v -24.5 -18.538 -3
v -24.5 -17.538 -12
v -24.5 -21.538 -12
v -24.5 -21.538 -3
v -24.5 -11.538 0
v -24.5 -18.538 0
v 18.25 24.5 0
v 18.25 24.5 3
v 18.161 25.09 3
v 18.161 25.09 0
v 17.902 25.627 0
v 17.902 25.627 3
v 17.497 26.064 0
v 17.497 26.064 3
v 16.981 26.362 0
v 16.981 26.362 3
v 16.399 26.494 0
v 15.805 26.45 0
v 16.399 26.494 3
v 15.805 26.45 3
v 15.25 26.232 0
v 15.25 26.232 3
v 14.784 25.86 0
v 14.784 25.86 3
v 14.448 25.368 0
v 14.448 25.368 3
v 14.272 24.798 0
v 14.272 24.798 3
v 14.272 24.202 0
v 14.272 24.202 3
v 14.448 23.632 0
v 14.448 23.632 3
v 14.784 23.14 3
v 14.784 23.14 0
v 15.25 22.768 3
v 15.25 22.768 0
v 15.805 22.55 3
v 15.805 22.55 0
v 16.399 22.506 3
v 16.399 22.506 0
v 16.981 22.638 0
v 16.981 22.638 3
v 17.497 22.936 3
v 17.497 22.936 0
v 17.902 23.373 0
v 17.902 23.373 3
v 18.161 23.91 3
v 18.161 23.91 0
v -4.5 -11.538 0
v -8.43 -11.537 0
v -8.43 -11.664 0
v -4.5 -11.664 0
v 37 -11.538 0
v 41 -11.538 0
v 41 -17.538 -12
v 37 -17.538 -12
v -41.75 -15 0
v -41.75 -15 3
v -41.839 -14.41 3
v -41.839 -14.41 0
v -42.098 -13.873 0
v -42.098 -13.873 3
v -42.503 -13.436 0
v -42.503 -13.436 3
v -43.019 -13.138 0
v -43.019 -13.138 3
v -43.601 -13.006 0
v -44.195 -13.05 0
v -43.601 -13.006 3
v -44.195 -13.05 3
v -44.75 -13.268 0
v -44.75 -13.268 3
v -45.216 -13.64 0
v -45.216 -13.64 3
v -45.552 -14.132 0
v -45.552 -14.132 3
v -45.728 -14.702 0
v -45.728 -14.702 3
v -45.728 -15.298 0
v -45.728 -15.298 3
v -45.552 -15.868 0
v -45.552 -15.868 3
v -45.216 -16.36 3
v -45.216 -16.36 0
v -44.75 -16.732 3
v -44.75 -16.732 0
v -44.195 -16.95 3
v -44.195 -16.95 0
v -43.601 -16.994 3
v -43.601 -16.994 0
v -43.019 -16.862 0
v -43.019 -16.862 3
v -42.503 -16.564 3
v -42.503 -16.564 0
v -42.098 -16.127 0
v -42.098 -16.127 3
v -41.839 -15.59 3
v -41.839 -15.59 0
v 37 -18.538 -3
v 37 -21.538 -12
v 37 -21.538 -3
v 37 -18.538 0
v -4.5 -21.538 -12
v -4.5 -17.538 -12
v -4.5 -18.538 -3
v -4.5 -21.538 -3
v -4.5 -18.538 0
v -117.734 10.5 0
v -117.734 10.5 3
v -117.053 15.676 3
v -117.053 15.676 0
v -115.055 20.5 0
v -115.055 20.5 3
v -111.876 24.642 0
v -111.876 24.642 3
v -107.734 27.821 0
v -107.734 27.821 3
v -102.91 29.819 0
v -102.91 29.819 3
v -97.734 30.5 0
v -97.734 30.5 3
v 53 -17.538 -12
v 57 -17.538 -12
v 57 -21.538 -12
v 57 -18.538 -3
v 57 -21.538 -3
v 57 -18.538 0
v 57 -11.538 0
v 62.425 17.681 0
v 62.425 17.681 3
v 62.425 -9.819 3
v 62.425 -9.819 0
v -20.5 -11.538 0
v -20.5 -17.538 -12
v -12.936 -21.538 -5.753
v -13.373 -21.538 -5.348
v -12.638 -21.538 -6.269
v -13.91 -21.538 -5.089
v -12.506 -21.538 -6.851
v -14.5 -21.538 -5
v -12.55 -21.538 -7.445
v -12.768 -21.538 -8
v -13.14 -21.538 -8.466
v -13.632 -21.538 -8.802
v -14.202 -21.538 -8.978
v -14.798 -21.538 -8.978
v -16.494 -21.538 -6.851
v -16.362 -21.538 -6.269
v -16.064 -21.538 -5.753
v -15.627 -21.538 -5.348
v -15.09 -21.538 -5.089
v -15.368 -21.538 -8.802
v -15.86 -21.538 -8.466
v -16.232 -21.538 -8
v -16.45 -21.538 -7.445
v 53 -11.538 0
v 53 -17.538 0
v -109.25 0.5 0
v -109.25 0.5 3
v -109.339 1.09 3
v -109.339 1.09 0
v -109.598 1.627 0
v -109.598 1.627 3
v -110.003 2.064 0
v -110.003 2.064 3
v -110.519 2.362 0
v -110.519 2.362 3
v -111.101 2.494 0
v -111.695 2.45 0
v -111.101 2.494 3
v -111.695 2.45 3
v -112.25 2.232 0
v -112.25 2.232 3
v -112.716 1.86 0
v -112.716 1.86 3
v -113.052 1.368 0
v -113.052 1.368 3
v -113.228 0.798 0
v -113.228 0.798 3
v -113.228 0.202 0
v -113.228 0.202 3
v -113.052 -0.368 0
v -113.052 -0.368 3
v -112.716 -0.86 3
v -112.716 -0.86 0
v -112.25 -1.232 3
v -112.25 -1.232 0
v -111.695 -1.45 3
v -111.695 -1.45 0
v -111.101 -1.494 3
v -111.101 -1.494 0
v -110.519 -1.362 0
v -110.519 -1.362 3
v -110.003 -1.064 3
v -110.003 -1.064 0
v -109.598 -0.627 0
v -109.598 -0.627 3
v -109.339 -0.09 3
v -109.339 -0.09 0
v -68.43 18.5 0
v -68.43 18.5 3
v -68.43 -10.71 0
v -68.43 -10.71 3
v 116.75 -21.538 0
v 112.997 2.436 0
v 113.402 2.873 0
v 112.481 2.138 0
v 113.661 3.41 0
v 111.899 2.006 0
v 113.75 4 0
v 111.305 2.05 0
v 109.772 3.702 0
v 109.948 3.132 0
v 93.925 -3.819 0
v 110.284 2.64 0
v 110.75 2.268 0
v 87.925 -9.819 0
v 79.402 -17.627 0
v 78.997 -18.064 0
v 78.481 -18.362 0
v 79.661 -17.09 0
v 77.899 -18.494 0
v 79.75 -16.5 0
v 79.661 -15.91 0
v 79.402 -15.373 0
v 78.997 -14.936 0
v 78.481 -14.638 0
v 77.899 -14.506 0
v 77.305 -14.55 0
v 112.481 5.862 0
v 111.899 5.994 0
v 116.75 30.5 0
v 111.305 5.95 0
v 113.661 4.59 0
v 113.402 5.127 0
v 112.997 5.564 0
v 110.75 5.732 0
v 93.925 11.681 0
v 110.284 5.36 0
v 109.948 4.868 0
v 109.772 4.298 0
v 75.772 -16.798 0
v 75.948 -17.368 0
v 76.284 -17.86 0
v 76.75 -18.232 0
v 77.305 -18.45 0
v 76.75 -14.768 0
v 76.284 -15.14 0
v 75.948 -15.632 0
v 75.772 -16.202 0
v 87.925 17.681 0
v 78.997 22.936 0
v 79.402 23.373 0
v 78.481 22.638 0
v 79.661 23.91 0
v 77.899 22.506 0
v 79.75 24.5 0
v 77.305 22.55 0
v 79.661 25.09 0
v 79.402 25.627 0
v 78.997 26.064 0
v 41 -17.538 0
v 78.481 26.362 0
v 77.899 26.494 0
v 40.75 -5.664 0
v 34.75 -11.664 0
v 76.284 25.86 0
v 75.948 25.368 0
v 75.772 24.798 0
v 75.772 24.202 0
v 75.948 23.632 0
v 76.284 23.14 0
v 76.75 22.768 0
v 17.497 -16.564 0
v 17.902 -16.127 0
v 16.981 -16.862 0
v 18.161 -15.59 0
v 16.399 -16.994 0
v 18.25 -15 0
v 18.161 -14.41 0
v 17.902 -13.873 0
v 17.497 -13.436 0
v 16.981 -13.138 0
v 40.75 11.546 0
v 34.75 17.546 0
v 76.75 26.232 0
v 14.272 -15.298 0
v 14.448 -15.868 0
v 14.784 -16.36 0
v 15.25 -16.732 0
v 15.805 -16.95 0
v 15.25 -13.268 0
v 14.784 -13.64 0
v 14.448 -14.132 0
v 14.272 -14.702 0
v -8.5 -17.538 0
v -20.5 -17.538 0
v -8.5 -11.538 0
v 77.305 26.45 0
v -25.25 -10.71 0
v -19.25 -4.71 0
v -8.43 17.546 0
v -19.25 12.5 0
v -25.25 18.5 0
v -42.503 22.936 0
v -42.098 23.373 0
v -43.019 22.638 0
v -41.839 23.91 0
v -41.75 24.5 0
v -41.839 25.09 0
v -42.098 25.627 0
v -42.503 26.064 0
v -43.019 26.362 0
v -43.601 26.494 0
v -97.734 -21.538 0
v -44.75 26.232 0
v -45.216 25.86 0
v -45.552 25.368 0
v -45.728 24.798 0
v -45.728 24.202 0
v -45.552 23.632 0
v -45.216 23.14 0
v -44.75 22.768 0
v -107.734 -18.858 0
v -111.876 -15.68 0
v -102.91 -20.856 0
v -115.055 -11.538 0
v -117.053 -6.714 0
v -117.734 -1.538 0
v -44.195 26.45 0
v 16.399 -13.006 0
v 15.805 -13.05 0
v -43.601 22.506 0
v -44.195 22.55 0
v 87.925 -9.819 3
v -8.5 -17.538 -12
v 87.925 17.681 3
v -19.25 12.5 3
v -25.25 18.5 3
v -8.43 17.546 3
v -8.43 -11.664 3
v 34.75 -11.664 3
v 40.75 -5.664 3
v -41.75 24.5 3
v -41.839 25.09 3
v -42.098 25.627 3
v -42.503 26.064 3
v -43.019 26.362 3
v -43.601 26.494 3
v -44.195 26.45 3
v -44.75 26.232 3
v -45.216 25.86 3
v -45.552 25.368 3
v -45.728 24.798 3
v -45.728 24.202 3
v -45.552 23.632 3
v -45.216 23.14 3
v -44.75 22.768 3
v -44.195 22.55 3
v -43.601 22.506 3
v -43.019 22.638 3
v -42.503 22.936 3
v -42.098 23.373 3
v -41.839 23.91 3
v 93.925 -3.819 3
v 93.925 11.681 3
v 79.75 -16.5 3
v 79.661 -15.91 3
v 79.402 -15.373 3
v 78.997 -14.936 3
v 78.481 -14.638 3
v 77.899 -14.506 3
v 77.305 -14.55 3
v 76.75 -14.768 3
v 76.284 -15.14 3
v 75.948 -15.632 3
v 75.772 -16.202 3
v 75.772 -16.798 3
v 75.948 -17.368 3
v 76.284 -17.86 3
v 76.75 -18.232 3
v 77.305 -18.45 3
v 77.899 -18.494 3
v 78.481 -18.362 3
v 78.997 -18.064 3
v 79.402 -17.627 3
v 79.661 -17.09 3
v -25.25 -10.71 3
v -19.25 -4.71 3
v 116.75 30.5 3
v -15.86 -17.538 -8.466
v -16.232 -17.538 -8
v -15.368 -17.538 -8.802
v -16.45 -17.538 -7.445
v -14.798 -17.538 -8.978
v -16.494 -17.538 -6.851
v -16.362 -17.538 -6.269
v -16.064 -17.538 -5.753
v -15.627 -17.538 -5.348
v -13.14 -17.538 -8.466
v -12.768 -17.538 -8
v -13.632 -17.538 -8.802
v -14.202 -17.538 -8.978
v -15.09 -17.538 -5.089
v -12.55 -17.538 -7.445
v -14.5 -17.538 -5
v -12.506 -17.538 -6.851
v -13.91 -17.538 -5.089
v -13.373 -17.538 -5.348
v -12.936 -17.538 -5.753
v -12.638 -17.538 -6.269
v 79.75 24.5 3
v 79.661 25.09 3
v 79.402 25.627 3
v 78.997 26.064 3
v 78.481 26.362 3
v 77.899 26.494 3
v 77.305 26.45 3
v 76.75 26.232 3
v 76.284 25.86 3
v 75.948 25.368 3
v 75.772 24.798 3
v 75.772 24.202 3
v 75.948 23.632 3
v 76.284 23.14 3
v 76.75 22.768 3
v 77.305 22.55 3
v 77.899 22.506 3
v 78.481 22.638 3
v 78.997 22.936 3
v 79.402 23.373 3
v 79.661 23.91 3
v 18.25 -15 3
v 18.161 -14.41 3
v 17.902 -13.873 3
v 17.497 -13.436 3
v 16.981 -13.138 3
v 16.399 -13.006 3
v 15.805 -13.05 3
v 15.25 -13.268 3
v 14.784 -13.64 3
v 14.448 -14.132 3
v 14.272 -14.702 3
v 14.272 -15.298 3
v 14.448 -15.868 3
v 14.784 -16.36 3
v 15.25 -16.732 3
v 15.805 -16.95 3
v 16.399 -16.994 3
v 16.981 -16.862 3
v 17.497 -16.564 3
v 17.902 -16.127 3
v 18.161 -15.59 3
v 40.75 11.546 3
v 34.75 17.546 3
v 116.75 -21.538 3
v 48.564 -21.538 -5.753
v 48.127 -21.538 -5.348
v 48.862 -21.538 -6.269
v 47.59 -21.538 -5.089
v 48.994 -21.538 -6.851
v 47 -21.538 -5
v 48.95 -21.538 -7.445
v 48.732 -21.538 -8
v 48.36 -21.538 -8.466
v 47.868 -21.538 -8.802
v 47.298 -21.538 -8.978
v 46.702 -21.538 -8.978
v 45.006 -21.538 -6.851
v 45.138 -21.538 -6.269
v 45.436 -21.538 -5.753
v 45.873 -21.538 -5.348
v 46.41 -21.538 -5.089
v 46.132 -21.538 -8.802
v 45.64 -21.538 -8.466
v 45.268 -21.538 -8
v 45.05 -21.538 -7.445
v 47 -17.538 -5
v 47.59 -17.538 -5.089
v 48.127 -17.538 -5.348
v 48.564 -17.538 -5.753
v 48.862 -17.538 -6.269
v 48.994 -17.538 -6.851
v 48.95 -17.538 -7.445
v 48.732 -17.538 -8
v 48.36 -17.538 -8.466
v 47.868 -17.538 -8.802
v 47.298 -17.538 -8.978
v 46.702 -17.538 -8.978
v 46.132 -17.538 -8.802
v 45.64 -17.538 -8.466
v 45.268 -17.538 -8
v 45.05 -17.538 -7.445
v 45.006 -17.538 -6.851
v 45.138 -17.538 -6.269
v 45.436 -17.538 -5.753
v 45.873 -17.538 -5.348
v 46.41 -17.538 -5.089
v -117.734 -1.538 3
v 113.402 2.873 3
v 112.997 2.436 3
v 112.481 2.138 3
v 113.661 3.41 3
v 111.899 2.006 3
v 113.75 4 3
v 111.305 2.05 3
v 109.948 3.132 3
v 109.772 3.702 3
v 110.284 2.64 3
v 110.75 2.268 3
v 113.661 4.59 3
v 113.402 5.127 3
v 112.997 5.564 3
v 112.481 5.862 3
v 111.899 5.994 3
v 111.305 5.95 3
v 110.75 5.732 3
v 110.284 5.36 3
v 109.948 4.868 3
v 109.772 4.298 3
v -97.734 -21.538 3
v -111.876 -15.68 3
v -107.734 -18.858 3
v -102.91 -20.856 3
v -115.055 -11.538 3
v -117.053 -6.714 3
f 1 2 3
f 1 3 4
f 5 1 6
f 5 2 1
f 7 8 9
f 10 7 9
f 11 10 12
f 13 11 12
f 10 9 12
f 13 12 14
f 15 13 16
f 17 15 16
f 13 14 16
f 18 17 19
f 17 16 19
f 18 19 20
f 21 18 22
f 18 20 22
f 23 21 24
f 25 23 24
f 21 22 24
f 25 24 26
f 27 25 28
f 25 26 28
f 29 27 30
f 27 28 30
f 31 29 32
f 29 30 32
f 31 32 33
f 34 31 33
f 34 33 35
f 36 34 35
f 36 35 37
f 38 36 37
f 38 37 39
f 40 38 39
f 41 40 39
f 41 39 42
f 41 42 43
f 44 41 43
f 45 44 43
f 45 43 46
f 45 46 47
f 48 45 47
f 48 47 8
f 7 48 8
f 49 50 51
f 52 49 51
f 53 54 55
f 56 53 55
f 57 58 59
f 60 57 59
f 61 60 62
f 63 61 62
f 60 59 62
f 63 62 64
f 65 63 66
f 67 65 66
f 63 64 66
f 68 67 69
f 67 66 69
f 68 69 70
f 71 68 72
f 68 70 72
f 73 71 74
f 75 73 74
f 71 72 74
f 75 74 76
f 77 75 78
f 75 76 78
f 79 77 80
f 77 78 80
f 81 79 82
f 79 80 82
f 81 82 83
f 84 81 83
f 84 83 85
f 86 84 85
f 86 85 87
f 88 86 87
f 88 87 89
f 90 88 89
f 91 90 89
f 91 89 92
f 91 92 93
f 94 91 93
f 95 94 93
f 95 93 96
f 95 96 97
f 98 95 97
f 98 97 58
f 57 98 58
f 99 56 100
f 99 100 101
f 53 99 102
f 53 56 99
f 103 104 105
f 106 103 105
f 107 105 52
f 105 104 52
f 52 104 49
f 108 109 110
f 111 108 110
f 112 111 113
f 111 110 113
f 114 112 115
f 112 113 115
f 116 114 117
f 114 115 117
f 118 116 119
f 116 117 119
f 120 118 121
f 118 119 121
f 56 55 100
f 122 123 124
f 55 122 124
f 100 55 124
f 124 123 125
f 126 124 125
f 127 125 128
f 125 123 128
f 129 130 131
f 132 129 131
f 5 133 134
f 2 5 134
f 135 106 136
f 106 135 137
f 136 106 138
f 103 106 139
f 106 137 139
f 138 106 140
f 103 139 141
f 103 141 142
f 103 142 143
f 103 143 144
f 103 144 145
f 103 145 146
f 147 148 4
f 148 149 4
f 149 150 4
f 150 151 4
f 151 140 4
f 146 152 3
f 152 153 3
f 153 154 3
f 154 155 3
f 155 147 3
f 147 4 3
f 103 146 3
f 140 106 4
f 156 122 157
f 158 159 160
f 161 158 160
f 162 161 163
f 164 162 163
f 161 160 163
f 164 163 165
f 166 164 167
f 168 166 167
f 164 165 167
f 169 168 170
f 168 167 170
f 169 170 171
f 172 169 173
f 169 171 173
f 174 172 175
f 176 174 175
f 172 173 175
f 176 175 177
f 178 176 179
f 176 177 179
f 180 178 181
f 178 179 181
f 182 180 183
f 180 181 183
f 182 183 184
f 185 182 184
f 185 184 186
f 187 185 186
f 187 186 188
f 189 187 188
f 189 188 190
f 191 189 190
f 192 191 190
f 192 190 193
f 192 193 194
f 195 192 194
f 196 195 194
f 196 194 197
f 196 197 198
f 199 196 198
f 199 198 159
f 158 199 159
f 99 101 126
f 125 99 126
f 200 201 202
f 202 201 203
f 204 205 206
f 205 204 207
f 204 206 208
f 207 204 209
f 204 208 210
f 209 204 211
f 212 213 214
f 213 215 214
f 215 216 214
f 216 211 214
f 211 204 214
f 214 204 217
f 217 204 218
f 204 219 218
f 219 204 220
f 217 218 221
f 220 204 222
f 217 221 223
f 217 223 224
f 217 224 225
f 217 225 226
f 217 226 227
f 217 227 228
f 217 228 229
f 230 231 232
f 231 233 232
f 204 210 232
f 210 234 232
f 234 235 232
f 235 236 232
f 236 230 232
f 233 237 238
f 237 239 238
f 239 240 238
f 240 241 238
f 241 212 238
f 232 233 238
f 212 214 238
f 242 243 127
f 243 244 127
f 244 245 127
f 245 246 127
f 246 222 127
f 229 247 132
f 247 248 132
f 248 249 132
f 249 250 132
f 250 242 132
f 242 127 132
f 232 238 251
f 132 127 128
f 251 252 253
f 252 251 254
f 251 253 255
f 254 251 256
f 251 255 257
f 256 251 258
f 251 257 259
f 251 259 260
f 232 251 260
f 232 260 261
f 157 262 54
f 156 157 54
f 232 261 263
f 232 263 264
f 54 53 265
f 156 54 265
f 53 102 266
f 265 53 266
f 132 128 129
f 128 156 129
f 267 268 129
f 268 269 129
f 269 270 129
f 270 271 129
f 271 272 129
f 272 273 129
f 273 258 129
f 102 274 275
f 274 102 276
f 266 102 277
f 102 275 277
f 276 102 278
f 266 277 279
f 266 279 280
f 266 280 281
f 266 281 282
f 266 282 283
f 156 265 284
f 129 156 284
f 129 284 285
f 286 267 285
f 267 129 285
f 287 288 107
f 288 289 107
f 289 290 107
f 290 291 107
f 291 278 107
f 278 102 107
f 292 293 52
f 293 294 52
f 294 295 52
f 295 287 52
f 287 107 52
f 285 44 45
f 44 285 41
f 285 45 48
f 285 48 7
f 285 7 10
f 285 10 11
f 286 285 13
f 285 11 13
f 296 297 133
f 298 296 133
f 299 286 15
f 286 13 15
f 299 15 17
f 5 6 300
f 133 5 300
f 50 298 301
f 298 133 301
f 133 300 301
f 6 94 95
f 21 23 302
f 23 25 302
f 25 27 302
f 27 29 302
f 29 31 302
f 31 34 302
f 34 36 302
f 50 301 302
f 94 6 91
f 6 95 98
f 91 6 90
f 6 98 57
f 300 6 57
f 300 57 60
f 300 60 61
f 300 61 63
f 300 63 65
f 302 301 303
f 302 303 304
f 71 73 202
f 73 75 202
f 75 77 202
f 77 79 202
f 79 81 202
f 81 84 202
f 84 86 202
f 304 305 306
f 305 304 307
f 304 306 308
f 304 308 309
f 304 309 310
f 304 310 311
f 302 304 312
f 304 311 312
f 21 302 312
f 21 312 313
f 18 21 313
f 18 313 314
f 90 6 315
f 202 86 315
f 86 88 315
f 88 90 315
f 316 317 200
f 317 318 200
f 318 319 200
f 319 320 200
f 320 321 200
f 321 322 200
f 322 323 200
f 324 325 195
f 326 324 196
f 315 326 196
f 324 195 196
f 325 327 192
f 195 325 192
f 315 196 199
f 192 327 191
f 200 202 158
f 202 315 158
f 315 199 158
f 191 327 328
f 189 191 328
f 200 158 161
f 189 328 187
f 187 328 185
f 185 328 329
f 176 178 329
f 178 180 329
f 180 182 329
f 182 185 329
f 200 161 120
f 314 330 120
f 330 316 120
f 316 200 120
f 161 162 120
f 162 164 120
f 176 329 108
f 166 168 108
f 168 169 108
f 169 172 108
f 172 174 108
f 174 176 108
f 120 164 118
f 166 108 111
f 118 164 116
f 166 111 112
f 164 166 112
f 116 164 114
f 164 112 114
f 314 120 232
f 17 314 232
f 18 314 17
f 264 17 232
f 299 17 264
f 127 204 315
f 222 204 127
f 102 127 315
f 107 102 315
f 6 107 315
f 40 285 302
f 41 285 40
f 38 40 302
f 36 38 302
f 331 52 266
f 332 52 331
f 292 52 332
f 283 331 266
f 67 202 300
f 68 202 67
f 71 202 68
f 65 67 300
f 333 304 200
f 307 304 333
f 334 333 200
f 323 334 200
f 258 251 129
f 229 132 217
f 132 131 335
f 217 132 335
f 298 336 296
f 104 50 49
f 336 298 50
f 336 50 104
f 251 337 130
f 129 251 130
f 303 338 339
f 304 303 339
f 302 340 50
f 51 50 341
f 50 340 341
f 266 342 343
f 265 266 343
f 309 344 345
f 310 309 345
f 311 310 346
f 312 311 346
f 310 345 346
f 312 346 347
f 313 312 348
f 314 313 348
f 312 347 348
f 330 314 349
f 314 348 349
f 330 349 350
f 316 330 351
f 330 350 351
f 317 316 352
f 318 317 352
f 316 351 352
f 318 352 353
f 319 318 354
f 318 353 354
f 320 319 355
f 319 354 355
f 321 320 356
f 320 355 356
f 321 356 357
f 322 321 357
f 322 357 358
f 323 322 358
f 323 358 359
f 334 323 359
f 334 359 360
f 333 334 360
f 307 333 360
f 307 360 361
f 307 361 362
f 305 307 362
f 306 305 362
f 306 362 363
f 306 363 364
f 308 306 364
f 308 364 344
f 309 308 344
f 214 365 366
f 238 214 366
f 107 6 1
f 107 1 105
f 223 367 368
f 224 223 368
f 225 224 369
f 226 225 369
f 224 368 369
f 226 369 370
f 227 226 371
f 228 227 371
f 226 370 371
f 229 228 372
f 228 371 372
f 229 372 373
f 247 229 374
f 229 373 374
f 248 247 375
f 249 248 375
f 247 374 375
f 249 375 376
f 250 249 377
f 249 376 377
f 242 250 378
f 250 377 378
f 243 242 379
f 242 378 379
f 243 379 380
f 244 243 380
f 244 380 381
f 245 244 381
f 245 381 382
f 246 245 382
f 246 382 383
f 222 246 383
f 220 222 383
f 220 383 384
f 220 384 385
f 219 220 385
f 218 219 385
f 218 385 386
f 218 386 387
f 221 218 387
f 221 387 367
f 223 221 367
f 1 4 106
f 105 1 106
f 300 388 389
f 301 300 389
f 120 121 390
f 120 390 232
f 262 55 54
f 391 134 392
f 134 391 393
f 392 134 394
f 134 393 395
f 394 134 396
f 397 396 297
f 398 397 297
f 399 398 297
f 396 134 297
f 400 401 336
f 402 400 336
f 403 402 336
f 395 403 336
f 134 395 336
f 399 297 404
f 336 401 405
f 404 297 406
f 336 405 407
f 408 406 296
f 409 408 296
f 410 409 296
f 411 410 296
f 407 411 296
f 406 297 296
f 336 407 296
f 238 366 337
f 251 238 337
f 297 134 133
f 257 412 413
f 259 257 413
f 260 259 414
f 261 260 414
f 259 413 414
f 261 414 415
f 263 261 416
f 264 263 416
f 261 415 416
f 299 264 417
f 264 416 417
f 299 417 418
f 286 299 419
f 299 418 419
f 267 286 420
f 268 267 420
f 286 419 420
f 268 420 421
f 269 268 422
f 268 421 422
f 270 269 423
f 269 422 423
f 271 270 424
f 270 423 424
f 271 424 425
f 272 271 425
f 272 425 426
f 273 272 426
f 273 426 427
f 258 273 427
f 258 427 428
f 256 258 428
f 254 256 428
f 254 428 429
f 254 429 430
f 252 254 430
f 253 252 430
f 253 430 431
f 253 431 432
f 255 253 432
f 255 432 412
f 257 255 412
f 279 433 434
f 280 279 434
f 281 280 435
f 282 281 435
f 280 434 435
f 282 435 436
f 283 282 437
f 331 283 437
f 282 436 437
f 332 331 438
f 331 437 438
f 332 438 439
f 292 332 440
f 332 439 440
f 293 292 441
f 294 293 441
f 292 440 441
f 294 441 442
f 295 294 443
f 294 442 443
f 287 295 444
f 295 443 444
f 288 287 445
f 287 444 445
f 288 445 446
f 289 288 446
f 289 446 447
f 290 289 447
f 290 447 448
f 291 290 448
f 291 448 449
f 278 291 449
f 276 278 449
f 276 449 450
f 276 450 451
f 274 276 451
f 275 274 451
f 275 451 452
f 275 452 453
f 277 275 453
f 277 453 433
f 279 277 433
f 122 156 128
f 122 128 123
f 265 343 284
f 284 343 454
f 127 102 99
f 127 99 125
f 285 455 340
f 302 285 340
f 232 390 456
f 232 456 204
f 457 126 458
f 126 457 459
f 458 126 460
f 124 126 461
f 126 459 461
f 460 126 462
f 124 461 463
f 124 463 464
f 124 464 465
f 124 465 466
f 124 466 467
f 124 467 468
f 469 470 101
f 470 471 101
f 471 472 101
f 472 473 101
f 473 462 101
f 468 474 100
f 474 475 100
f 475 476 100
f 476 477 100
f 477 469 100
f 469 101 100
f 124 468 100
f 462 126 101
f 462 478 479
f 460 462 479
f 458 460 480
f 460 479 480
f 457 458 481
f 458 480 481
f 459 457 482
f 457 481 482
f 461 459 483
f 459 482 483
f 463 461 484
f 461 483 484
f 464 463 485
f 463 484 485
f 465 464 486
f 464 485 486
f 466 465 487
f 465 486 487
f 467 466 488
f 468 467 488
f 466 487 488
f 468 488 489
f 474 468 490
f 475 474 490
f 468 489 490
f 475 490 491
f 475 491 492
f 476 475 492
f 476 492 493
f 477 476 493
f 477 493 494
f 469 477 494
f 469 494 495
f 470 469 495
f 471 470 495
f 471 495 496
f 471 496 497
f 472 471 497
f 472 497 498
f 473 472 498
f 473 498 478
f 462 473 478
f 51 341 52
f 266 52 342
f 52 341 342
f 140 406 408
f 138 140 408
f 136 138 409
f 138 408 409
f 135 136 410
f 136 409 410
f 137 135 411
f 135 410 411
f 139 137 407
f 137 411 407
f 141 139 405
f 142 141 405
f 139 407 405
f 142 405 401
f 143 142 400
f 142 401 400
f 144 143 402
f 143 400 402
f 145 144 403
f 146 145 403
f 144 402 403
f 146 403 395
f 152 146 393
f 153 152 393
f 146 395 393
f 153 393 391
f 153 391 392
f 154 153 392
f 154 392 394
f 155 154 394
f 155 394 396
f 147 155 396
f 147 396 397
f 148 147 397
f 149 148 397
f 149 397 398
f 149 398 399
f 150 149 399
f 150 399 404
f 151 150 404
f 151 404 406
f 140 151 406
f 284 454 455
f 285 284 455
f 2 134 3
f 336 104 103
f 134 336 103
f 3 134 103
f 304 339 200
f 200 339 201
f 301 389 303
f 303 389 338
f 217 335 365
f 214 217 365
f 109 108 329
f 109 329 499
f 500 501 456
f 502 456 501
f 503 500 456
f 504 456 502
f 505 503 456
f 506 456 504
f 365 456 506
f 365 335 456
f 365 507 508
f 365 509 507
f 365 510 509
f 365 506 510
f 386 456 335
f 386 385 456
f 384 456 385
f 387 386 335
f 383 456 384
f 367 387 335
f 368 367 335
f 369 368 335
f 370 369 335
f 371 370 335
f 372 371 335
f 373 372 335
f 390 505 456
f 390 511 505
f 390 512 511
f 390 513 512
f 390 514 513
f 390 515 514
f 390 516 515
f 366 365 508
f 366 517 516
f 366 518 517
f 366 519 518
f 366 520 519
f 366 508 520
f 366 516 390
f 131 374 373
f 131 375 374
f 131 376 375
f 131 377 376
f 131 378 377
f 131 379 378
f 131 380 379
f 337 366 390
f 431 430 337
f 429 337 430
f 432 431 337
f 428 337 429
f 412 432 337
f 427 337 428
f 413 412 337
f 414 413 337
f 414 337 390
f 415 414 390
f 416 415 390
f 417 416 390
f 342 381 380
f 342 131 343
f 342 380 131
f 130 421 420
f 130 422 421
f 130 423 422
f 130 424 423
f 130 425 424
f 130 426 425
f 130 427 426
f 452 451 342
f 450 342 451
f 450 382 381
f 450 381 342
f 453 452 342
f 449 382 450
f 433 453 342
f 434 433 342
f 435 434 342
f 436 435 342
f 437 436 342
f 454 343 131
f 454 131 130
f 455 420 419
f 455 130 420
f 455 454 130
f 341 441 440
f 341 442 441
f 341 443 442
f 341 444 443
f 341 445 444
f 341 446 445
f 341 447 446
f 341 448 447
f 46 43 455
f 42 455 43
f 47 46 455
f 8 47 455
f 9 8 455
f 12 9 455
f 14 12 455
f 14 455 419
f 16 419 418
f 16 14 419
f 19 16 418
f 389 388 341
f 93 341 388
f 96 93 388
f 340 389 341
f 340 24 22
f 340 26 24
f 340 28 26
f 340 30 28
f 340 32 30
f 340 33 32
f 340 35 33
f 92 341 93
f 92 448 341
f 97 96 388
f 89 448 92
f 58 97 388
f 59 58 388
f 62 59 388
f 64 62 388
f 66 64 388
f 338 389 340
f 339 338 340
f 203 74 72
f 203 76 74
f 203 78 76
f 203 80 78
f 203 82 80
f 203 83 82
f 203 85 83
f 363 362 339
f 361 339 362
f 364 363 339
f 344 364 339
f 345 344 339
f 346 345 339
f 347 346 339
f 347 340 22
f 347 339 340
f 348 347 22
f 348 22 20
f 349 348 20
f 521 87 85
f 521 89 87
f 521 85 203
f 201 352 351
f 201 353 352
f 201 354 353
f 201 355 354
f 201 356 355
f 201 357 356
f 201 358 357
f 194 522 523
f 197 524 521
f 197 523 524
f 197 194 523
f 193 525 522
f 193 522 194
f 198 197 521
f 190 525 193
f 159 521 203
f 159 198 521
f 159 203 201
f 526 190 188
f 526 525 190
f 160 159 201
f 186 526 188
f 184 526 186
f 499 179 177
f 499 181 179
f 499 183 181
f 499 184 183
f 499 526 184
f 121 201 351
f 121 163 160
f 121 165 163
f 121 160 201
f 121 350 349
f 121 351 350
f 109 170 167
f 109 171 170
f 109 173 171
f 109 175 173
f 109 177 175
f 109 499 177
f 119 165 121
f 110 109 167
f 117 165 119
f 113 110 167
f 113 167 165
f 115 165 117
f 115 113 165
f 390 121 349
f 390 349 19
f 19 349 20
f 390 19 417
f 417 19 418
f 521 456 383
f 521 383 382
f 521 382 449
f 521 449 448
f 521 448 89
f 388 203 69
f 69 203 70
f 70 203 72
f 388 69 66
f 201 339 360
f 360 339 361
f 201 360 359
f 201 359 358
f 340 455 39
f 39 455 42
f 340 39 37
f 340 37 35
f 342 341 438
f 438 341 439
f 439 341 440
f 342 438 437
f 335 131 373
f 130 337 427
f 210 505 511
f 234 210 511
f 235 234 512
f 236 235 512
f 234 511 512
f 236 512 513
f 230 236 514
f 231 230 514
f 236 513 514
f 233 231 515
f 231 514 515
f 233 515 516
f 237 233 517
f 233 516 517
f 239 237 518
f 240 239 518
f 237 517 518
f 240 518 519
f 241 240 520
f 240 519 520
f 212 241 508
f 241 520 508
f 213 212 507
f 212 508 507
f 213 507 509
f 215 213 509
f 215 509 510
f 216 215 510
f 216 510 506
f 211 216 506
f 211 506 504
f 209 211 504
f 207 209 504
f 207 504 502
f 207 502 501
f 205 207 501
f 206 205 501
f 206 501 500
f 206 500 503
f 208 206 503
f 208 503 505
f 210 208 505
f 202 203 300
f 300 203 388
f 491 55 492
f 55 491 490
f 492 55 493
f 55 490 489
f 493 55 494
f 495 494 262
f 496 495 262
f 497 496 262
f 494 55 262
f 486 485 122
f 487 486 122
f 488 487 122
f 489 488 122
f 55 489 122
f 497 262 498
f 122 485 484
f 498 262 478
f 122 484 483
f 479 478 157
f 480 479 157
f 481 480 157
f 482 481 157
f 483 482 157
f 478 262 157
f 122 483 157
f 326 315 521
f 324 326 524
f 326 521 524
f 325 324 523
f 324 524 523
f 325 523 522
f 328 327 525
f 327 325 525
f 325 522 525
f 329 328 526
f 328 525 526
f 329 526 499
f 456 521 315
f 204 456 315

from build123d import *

# Parameters (mm, degrees)
SKETCH1_W            = 229.5
SKETCH1_H            = 49
BOSS_EXTRUDE1_DEPTH  = 3
SKETCH3_W            = 229.5
SKETCH3_H            = 3
BOSS_EXTRUDE2_DEPTH  = 6
SKETCH2_R            = 2
CUT_EXTRUDE1_DEPTH   = 31.956
SKETCH4_R            = 2
CUT_EXTRUDE2_DEPTH   = 31.956
BOSS_EXTRUDE3_DEPTH  = 3
SKETCH10_W           = 229.5
SKETCH10_H           = 2.9625
CUT_EXTRUDE5_DEPTH   = 11.382
BOSS_EXTRUDE4_DEPTH  = 12
SKETCH13_R           = 2
CUT_EXTRUDE7_DEPTH   = 15
BOSS_EXTRUDE5_DEPTH  = 4
BOSS_EXTRUDE6_DEPTH  = 4
BOSS_EXTRUDE7_DEPTH  = 4
BOSS_EXTRUDE8_DEPTH  = 4
SKETCH19_W           = 3
SKETCH19_H           = 52.0375
BOSS_EXTRUDE9_DEPTH  = 2.984
CUT_EXTRUDE8_DEPTH   = 20.764
SKETCH23_W           = 3
SKETCH23_H           = 52.0375
BOSS_EXTRUDE10_DEPTH = 2
SKETCH24_W           = 20
SKETCH24_H           = 3
CUT_EXTRUDE9_DEPTH   = 3


with BuildPart() as part:
    # Sketch1 → Boss-Extrude1 (new body)
    with BuildSketch(Plane.XY):
        Rectangle(SKETCH1_W, SKETCH1_H)
    extrude(amount=BOSS_EXTRUDE1_DEPTH)

    # Sketch3 → Boss-Extrude2 (add)
    with BuildSketch(Plane(origin=(0, 24.5, 0), x_dir=(1, 0, 0), z_dir=(0, 1, 0))):
        with Locations((0, -1.5)):
            Rectangle(SKETCH3_W, SKETCH3_H)
    extrude(amount=BOSS_EXTRUDE2_DEPTH)

    # Sketch2 → Cut-Extrude1 (cut)
    with BuildSketch(Plane.XY.offset(3)):
        with Locations((111.75, 4)):
            Circle(SKETCH2_R)
        with Locations((-111.25, 0.5)):
            Circle(SKETCH2_R)
        with Locations((-43.75, 24.5)):
            Circle(SKETCH2_R)
        with Locations((16.25, 24.5)):
            Circle(SKETCH2_R)
        with Locations((77.75, 24.5)):
            Circle(SKETCH2_R)
    extrude(amount=-CUT_EXTRUDE1_DEPTH, mode=Mode.SUBTRACT)

    # Sketch4 → Cut-Extrude2 (cut)
    with BuildSketch(Plane.XY.offset(3)):
        Polygon((87.924883288, 17.681445753), (62.424883288, 17.681445753), (62.424883288, -9.818554247), (87.924883288, -9.818554247), (93.924883288, -3.818554247), (93.924883288, 11.681445753), align=None)
        Polygon((-19.25, -4.71), (-19.25, 12.5), (-25.25, 18.5), (-68.43, 18.5), (-68.43, -10.71), (-25.25, -10.71), align=None)
        Polygon((-8.429595307, -11.664), (34.750404693, -11.664), (40.750404693, -5.664), (40.750404693, 11.546), (34.750404693, 17.546), (-8.429595307, 17.546), align=None)
        with Locations((-43.75, -15)):
            Circle(SKETCH4_R)
        with Locations((16.25, -15)):
            Circle(SKETCH4_R)
        with Locations((77.75, -16.5)):
            Circle(SKETCH4_R)
    extrude(amount=-CUT_EXTRUDE2_DEPTH, mode=Mode.SUBTRACT)

    # Sketch5 → Boss-Extrude3 (add)
    with BuildSketch(Plane.XY.offset(3)):
        with BuildLine():
            ThreePointArc((-114.75, 5.373397172), (-117.25, 0.5), (-114.75, -4.373397172))
            Line((-114.75, -4.373397172), (-114.75, 5.373397172))
        make_face()
    extrude(amount=-BOSS_EXTRUDE3_DEPTH)

    # Sketch10 → Cut-Extrude5 (cut)
    with BuildSketch(Plane(origin=(0, 0, 0), x_dir=(-1, 0, 0), z_dir=(0, 0, -1))):
        with Locations((0, -23.01875)):
            Rectangle(SKETCH10_W, SKETCH10_H)
    extrude(amount=-CUT_EXTRUDE5_DEPTH, mode=Mode.SUBTRACT)

    # Sketch12 → Boss-Extrude4 (add)
    with BuildSketch(Plane(origin=(0, 0, 0), x_dir=(-1, 0, 0), z_dir=(0, 0, -1))):
        Polygon((-47, -21.5375), (-41, -21.5375), (-41, -17.5375), (-53, -17.5375), (-53, -21.5375), align=None)
        Polygon((8.5, -21.5375), (13.75, -21.5375), (20.5, -21.5375), (20.5, -17.5375), (8.5, -17.5375), align=None)
    extrude(amount=BOSS_EXTRUDE4_DEPTH)

    # Sketch13 → Cut-Extrude7 (cut)
    with BuildSketch(Plane(origin=(0, -17.5375, 0), x_dir=(1, 0, 0), z_dir=(0, 1, 0))):
        with Locations(Location((-14.5, 7, 0), (0, 0, 270))):
            Circle(SKETCH13_R)
        with Locations(Location((47, 7, 0), (0, 0, 270))):
            Circle(SKETCH13_R)
    extrude(amount=-CUT_EXTRUDE7_DEPTH, mode=Mode.SUBTRACT)

    # Sketch14 → Boss-Extrude5 (add)
    with BuildSketch(Plane(origin=(53, 0, 0), x_dir=(0, 0, -1), z_dir=(1, 0, 0))):
        Polygon((0, -17.5375), (0, -11.5375), (12, -17.5375), (12, -21.5375), (0, -21.5375), align=None)
    extrude(amount=BOSS_EXTRUDE5_DEPTH)

    # Sketch15 → Boss-Extrude6 (add)
    with BuildSketch(Plane.ZY.offset(-41)):
        Polygon((0, -17.5375), (0, -11.5375), (-12, -17.5375), (-12, -21.5375), (0, -21.5375), align=None)
    extrude(amount=BOSS_EXTRUDE6_DEPTH)

    # Sketch16 → Boss-Extrude7 (add)
    with BuildSketch(Plane(origin=(-8.5, 0, 0), x_dir=(0, 0, -1), z_dir=(1, 0, 0))):
        Polygon((0, -17.5375), (0, -11.5375), (12, -17.5375), (12, -21.5375), (0, -21.5375), align=None)
    extrude(amount=BOSS_EXTRUDE7_DEPTH)

    # Sketch17 → Boss-Extrude8 (add)
    with BuildSketch(Plane.ZY.offset(20.5)):
        Polygon((0, -17.5375), (0, -11.5375), (-12, -17.5375), (-12, -21.5375), (0, -21.5375), align=None)
    extrude(amount=BOSS_EXTRUDE8_DEPTH)

    # Sketch19 → Boss-Extrude9 (add)
    with BuildSketch(Plane.ZY.offset(114.75)):
        with Locations((1.5, 4.48125)):
            Rectangle(SKETCH19_W, SKETCH19_H)
    extrude(amount=BOSS_EXTRUDE9_DEPTH)

    # Sketch20 → Cut-Extrude8 (cut)
    with BuildSketch(Plane.XY.offset(3)):
        with BuildLine():
            ThreePointArc((-117.734, 10.5), (-111.876135624, 24.642135624), (-97.734, 30.5))
            Line((-97.734, 30.5), (-117.734, 30.5))
            Line((-117.734, 30.5), (-117.734, 10.5))
        make_face()
        with BuildLine():
            ThreePointArc((-97.734, -21.5375), (-111.876135624, -15.679635624), (-117.734, -1.5375))
            Line((-117.734, -1.5375), (-117.734, -21.5375))
            Line((-117.734, -21.5375), (-97.734, -21.5375))
        make_face()
    extrude(amount=-CUT_EXTRUDE8_DEPTH, mode=Mode.SUBTRACT)

    # Sketch23 → Boss-Extrude10 (add)
    with BuildSketch(Plane(origin=(114.75, 0, 0), x_dir=(0, 0, -1), z_dir=(1, 0, 0))):
        with Locations((-1.5, 4.48125)):
            Rectangle(SKETCH23_W, SKETCH23_H)
    extrude(amount=BOSS_EXTRUDE10_DEPTH)

    # Sketch24 → Cut-Extrude9 (cut)
    with BuildSketch(Plane.XZ.offset(21.5375)):
        with Locations((-14.5, -1.5)):
            Rectangle(SKETCH24_W, SKETCH24_H)
        with Locations((47, -1.5)):
            Rectangle(SKETCH24_W, SKETCH24_H)
    extrude(amount=-CUT_EXTRUDE9_DEPTH, mode=Mode.SUBTRACT)


solid = part.part
